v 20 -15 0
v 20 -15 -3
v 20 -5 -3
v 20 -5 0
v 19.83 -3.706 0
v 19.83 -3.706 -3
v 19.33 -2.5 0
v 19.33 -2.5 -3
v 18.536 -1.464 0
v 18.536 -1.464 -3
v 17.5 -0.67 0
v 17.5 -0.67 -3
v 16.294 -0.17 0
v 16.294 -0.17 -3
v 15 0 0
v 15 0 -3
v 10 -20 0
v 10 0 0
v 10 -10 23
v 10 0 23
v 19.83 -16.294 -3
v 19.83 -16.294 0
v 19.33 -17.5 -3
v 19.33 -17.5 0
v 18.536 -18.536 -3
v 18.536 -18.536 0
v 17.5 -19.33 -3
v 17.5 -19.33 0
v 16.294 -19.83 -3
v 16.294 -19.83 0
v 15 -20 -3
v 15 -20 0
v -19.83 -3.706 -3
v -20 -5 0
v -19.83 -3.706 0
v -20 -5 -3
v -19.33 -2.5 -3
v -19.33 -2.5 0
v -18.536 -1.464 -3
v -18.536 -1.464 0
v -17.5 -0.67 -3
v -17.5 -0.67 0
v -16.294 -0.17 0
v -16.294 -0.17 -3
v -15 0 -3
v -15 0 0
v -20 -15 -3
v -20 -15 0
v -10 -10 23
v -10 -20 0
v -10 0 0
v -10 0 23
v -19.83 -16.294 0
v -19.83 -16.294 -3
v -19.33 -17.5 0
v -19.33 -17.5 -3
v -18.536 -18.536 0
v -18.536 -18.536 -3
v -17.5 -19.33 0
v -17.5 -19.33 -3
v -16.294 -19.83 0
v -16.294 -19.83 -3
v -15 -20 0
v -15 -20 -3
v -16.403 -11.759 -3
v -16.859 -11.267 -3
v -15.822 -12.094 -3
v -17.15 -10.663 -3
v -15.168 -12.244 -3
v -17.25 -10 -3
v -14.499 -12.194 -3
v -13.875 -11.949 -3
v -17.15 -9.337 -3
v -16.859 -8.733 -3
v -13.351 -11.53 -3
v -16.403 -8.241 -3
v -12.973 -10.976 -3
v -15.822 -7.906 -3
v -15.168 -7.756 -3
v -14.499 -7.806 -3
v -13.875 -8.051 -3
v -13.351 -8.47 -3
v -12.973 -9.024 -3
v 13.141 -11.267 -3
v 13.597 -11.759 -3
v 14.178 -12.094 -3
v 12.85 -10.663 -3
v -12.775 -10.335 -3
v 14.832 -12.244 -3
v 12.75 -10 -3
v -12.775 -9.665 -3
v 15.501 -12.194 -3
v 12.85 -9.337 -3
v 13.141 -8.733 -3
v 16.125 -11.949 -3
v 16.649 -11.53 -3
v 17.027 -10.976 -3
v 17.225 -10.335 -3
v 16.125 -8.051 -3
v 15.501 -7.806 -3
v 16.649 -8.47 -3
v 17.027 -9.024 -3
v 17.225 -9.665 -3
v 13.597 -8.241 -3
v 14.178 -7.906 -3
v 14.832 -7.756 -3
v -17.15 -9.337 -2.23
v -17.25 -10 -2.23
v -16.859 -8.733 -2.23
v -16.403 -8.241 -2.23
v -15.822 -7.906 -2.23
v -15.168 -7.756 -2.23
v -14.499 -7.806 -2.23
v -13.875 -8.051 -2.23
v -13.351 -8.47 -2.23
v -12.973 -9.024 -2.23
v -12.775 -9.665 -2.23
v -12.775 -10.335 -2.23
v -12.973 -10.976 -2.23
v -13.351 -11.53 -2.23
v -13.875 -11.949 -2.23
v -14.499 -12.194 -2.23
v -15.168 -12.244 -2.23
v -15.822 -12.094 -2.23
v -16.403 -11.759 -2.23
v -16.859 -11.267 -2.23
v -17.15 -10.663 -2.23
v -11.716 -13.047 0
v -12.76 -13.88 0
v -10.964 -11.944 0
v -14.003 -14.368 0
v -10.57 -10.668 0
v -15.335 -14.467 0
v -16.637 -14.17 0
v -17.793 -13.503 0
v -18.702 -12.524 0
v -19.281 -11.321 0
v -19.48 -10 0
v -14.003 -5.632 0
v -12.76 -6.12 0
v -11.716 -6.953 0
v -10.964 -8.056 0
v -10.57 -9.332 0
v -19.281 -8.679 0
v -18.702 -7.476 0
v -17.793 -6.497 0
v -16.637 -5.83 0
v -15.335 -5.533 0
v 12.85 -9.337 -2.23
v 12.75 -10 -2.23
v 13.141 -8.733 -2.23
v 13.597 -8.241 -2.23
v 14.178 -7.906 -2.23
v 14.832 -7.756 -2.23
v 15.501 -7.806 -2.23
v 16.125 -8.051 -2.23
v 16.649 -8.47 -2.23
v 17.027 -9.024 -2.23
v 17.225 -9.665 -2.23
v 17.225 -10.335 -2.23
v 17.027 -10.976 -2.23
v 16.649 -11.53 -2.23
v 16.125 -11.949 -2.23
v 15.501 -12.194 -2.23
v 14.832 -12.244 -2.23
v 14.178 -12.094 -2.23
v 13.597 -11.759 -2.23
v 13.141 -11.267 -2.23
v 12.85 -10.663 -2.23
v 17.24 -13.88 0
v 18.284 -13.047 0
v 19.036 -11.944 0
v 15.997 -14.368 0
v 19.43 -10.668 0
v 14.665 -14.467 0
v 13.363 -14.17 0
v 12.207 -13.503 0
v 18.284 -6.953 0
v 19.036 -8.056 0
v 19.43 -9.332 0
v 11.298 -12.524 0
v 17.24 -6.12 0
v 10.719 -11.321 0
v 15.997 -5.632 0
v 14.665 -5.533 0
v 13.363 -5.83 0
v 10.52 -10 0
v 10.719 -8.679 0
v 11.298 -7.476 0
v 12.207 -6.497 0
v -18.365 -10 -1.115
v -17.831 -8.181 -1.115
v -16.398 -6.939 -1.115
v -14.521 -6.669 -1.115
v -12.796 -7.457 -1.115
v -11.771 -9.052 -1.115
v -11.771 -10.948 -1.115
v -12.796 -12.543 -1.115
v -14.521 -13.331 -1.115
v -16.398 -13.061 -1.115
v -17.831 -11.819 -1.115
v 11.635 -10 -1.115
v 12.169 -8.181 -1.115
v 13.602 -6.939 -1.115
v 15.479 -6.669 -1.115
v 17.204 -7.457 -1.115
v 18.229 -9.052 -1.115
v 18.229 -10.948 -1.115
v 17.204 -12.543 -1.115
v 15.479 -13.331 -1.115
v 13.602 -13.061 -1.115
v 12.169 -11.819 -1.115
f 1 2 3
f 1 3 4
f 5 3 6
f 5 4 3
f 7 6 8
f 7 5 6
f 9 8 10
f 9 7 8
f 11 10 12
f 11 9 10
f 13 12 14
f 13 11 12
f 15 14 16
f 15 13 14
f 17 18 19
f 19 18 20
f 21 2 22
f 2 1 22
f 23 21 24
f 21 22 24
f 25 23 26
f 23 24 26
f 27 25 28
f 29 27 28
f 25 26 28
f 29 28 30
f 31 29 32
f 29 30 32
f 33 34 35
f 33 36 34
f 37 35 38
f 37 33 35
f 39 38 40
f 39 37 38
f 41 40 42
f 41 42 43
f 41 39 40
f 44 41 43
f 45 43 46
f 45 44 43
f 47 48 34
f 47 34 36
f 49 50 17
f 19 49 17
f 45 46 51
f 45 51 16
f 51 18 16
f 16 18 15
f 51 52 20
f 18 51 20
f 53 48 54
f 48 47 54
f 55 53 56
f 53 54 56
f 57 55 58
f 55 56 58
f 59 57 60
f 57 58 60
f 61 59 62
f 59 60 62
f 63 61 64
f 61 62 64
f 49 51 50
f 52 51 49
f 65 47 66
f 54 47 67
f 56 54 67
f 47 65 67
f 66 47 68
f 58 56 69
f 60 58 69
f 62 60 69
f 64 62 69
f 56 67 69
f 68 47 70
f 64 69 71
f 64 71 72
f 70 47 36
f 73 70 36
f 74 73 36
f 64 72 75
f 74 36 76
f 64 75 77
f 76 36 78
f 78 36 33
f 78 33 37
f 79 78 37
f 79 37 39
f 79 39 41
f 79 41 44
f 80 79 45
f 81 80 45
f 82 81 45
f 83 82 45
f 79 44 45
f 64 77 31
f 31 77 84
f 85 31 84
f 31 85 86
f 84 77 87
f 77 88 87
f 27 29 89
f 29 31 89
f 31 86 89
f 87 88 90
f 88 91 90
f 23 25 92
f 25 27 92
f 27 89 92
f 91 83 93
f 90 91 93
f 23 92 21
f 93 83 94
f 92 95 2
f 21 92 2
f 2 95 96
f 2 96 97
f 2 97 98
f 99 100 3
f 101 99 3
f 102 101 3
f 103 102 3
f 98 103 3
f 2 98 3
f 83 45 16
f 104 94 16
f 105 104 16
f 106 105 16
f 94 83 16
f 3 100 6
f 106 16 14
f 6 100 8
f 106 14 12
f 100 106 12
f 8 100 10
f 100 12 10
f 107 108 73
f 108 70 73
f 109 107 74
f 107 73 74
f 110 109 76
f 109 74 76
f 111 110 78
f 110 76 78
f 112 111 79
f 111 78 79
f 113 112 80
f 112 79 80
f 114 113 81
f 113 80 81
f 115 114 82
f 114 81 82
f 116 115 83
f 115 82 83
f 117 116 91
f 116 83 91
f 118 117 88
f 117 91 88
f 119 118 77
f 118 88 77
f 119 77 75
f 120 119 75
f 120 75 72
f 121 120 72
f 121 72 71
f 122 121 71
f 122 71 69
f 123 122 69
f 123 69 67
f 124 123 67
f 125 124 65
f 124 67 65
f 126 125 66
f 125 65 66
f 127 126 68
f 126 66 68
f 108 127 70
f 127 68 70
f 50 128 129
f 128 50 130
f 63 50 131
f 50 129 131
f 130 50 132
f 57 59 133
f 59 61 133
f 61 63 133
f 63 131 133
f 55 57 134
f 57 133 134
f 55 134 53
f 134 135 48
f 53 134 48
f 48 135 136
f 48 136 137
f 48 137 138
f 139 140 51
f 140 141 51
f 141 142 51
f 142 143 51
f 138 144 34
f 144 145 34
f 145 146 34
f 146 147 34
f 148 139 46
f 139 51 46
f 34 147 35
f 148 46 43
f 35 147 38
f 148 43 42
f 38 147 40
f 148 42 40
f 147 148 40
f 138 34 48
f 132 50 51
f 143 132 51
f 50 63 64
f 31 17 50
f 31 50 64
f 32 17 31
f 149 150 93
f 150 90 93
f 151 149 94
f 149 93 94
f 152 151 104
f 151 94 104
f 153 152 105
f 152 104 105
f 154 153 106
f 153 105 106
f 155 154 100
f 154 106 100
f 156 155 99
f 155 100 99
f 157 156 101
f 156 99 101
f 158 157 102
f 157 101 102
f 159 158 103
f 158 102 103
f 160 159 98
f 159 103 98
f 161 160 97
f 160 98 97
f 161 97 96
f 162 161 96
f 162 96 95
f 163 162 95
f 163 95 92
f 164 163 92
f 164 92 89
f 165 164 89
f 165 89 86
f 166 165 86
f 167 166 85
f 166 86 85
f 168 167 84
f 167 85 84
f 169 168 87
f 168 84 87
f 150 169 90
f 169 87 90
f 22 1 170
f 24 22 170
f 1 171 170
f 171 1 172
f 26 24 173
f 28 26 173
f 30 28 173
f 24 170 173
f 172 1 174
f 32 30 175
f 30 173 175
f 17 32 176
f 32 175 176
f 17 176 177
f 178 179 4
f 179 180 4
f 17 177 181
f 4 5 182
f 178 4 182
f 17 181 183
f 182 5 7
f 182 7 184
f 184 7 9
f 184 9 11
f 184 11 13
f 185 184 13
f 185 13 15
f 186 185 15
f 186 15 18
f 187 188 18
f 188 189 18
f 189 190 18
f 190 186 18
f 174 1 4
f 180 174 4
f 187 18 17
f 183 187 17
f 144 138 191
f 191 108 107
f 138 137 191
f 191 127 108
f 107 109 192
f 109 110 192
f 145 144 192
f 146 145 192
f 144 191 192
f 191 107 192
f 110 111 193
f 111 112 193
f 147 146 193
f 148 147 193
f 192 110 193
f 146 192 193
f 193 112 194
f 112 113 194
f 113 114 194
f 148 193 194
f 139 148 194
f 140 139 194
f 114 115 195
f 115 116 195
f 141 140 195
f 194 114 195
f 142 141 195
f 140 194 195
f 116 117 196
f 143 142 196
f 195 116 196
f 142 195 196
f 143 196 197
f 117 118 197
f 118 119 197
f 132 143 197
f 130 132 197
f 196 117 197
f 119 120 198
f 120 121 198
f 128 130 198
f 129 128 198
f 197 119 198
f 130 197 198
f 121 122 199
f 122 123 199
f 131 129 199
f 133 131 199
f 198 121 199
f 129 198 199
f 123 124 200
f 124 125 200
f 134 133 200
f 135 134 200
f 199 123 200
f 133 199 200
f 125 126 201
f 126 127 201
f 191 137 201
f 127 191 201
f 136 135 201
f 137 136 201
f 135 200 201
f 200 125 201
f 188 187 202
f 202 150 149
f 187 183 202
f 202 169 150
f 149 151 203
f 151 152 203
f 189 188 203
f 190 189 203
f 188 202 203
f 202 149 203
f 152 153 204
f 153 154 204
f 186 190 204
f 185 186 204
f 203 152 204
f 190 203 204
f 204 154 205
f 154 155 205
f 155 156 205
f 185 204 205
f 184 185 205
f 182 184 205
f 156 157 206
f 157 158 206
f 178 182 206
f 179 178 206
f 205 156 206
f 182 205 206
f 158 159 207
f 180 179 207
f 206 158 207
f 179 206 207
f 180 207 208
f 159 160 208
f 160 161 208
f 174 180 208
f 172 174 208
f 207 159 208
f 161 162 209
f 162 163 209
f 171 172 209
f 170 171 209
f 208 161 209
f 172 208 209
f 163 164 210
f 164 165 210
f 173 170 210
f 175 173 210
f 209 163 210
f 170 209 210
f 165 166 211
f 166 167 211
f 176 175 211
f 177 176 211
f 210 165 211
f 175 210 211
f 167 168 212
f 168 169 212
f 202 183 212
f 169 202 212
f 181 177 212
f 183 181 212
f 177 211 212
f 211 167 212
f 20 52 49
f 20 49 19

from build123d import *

# Parameters (mm, degrees)
F0_W           = 20
F0_H           = 23
F1_DEPTH       = 20
F2_SIZE2       = 23
F2_SIZE        = 10
F4_D           = 4.5
F4_DEPTH       = 12
F4_CSINK_D     = 8.96
F4_CSINK_ANGLE = 90
F4_TIP         = 1.3519363928
F5_R           = 5


with BuildPart() as f1:
    # F0 (on Front) → F1 (new body)
    with BuildSketch(Plane.XZ):
        with Locations((0, 11.5)):
            Rectangle(F0_W, F0_H)
        Polygon((10, 0), (-10, 0), (-20, 0), (-20, -3), (20, -3), (20, 0), align=None)
    extrude(amount=F1_DEPTH)

    # F2
    f2_edges = [f1.edges().sort_by_distance(p)[0] for p in [
        (0, -20, 23),
    ]]
    f2_side = f1.faces().sort_by_distance((0, -10, 23))[0]
    chamfer(f2_edges, length=F2_SIZE, length2=F2_SIZE2, reference=f2_side)

    # F4
    with Locations(Plane.XY):
        with Locations((-15, -10), (15, -10)):
            CounterSinkHole(F4_D / 2, F4_CSINK_D / 2, depth=F4_DEPTH, counter_sink_angle=F4_CSINK_ANGLE)
            with Locations((0, 0, -(F4_DEPTH + F4_TIP / 2))):  # 118° drill point
                Cone(0, F4_D / 2, F4_TIP, mode=Mode.SUBTRACT)

    # F5
    f5_edges = [f1.edges().sort_by_distance(p)[0] for p in [
        (-20, -20, -1.5),
        (20, -20, -1.5),
        (-20, 0, -1.5),
        (20, 0, -1.5),
    ]]
    fillet(f5_edges, radius=F5_R)


solid = f1.part
